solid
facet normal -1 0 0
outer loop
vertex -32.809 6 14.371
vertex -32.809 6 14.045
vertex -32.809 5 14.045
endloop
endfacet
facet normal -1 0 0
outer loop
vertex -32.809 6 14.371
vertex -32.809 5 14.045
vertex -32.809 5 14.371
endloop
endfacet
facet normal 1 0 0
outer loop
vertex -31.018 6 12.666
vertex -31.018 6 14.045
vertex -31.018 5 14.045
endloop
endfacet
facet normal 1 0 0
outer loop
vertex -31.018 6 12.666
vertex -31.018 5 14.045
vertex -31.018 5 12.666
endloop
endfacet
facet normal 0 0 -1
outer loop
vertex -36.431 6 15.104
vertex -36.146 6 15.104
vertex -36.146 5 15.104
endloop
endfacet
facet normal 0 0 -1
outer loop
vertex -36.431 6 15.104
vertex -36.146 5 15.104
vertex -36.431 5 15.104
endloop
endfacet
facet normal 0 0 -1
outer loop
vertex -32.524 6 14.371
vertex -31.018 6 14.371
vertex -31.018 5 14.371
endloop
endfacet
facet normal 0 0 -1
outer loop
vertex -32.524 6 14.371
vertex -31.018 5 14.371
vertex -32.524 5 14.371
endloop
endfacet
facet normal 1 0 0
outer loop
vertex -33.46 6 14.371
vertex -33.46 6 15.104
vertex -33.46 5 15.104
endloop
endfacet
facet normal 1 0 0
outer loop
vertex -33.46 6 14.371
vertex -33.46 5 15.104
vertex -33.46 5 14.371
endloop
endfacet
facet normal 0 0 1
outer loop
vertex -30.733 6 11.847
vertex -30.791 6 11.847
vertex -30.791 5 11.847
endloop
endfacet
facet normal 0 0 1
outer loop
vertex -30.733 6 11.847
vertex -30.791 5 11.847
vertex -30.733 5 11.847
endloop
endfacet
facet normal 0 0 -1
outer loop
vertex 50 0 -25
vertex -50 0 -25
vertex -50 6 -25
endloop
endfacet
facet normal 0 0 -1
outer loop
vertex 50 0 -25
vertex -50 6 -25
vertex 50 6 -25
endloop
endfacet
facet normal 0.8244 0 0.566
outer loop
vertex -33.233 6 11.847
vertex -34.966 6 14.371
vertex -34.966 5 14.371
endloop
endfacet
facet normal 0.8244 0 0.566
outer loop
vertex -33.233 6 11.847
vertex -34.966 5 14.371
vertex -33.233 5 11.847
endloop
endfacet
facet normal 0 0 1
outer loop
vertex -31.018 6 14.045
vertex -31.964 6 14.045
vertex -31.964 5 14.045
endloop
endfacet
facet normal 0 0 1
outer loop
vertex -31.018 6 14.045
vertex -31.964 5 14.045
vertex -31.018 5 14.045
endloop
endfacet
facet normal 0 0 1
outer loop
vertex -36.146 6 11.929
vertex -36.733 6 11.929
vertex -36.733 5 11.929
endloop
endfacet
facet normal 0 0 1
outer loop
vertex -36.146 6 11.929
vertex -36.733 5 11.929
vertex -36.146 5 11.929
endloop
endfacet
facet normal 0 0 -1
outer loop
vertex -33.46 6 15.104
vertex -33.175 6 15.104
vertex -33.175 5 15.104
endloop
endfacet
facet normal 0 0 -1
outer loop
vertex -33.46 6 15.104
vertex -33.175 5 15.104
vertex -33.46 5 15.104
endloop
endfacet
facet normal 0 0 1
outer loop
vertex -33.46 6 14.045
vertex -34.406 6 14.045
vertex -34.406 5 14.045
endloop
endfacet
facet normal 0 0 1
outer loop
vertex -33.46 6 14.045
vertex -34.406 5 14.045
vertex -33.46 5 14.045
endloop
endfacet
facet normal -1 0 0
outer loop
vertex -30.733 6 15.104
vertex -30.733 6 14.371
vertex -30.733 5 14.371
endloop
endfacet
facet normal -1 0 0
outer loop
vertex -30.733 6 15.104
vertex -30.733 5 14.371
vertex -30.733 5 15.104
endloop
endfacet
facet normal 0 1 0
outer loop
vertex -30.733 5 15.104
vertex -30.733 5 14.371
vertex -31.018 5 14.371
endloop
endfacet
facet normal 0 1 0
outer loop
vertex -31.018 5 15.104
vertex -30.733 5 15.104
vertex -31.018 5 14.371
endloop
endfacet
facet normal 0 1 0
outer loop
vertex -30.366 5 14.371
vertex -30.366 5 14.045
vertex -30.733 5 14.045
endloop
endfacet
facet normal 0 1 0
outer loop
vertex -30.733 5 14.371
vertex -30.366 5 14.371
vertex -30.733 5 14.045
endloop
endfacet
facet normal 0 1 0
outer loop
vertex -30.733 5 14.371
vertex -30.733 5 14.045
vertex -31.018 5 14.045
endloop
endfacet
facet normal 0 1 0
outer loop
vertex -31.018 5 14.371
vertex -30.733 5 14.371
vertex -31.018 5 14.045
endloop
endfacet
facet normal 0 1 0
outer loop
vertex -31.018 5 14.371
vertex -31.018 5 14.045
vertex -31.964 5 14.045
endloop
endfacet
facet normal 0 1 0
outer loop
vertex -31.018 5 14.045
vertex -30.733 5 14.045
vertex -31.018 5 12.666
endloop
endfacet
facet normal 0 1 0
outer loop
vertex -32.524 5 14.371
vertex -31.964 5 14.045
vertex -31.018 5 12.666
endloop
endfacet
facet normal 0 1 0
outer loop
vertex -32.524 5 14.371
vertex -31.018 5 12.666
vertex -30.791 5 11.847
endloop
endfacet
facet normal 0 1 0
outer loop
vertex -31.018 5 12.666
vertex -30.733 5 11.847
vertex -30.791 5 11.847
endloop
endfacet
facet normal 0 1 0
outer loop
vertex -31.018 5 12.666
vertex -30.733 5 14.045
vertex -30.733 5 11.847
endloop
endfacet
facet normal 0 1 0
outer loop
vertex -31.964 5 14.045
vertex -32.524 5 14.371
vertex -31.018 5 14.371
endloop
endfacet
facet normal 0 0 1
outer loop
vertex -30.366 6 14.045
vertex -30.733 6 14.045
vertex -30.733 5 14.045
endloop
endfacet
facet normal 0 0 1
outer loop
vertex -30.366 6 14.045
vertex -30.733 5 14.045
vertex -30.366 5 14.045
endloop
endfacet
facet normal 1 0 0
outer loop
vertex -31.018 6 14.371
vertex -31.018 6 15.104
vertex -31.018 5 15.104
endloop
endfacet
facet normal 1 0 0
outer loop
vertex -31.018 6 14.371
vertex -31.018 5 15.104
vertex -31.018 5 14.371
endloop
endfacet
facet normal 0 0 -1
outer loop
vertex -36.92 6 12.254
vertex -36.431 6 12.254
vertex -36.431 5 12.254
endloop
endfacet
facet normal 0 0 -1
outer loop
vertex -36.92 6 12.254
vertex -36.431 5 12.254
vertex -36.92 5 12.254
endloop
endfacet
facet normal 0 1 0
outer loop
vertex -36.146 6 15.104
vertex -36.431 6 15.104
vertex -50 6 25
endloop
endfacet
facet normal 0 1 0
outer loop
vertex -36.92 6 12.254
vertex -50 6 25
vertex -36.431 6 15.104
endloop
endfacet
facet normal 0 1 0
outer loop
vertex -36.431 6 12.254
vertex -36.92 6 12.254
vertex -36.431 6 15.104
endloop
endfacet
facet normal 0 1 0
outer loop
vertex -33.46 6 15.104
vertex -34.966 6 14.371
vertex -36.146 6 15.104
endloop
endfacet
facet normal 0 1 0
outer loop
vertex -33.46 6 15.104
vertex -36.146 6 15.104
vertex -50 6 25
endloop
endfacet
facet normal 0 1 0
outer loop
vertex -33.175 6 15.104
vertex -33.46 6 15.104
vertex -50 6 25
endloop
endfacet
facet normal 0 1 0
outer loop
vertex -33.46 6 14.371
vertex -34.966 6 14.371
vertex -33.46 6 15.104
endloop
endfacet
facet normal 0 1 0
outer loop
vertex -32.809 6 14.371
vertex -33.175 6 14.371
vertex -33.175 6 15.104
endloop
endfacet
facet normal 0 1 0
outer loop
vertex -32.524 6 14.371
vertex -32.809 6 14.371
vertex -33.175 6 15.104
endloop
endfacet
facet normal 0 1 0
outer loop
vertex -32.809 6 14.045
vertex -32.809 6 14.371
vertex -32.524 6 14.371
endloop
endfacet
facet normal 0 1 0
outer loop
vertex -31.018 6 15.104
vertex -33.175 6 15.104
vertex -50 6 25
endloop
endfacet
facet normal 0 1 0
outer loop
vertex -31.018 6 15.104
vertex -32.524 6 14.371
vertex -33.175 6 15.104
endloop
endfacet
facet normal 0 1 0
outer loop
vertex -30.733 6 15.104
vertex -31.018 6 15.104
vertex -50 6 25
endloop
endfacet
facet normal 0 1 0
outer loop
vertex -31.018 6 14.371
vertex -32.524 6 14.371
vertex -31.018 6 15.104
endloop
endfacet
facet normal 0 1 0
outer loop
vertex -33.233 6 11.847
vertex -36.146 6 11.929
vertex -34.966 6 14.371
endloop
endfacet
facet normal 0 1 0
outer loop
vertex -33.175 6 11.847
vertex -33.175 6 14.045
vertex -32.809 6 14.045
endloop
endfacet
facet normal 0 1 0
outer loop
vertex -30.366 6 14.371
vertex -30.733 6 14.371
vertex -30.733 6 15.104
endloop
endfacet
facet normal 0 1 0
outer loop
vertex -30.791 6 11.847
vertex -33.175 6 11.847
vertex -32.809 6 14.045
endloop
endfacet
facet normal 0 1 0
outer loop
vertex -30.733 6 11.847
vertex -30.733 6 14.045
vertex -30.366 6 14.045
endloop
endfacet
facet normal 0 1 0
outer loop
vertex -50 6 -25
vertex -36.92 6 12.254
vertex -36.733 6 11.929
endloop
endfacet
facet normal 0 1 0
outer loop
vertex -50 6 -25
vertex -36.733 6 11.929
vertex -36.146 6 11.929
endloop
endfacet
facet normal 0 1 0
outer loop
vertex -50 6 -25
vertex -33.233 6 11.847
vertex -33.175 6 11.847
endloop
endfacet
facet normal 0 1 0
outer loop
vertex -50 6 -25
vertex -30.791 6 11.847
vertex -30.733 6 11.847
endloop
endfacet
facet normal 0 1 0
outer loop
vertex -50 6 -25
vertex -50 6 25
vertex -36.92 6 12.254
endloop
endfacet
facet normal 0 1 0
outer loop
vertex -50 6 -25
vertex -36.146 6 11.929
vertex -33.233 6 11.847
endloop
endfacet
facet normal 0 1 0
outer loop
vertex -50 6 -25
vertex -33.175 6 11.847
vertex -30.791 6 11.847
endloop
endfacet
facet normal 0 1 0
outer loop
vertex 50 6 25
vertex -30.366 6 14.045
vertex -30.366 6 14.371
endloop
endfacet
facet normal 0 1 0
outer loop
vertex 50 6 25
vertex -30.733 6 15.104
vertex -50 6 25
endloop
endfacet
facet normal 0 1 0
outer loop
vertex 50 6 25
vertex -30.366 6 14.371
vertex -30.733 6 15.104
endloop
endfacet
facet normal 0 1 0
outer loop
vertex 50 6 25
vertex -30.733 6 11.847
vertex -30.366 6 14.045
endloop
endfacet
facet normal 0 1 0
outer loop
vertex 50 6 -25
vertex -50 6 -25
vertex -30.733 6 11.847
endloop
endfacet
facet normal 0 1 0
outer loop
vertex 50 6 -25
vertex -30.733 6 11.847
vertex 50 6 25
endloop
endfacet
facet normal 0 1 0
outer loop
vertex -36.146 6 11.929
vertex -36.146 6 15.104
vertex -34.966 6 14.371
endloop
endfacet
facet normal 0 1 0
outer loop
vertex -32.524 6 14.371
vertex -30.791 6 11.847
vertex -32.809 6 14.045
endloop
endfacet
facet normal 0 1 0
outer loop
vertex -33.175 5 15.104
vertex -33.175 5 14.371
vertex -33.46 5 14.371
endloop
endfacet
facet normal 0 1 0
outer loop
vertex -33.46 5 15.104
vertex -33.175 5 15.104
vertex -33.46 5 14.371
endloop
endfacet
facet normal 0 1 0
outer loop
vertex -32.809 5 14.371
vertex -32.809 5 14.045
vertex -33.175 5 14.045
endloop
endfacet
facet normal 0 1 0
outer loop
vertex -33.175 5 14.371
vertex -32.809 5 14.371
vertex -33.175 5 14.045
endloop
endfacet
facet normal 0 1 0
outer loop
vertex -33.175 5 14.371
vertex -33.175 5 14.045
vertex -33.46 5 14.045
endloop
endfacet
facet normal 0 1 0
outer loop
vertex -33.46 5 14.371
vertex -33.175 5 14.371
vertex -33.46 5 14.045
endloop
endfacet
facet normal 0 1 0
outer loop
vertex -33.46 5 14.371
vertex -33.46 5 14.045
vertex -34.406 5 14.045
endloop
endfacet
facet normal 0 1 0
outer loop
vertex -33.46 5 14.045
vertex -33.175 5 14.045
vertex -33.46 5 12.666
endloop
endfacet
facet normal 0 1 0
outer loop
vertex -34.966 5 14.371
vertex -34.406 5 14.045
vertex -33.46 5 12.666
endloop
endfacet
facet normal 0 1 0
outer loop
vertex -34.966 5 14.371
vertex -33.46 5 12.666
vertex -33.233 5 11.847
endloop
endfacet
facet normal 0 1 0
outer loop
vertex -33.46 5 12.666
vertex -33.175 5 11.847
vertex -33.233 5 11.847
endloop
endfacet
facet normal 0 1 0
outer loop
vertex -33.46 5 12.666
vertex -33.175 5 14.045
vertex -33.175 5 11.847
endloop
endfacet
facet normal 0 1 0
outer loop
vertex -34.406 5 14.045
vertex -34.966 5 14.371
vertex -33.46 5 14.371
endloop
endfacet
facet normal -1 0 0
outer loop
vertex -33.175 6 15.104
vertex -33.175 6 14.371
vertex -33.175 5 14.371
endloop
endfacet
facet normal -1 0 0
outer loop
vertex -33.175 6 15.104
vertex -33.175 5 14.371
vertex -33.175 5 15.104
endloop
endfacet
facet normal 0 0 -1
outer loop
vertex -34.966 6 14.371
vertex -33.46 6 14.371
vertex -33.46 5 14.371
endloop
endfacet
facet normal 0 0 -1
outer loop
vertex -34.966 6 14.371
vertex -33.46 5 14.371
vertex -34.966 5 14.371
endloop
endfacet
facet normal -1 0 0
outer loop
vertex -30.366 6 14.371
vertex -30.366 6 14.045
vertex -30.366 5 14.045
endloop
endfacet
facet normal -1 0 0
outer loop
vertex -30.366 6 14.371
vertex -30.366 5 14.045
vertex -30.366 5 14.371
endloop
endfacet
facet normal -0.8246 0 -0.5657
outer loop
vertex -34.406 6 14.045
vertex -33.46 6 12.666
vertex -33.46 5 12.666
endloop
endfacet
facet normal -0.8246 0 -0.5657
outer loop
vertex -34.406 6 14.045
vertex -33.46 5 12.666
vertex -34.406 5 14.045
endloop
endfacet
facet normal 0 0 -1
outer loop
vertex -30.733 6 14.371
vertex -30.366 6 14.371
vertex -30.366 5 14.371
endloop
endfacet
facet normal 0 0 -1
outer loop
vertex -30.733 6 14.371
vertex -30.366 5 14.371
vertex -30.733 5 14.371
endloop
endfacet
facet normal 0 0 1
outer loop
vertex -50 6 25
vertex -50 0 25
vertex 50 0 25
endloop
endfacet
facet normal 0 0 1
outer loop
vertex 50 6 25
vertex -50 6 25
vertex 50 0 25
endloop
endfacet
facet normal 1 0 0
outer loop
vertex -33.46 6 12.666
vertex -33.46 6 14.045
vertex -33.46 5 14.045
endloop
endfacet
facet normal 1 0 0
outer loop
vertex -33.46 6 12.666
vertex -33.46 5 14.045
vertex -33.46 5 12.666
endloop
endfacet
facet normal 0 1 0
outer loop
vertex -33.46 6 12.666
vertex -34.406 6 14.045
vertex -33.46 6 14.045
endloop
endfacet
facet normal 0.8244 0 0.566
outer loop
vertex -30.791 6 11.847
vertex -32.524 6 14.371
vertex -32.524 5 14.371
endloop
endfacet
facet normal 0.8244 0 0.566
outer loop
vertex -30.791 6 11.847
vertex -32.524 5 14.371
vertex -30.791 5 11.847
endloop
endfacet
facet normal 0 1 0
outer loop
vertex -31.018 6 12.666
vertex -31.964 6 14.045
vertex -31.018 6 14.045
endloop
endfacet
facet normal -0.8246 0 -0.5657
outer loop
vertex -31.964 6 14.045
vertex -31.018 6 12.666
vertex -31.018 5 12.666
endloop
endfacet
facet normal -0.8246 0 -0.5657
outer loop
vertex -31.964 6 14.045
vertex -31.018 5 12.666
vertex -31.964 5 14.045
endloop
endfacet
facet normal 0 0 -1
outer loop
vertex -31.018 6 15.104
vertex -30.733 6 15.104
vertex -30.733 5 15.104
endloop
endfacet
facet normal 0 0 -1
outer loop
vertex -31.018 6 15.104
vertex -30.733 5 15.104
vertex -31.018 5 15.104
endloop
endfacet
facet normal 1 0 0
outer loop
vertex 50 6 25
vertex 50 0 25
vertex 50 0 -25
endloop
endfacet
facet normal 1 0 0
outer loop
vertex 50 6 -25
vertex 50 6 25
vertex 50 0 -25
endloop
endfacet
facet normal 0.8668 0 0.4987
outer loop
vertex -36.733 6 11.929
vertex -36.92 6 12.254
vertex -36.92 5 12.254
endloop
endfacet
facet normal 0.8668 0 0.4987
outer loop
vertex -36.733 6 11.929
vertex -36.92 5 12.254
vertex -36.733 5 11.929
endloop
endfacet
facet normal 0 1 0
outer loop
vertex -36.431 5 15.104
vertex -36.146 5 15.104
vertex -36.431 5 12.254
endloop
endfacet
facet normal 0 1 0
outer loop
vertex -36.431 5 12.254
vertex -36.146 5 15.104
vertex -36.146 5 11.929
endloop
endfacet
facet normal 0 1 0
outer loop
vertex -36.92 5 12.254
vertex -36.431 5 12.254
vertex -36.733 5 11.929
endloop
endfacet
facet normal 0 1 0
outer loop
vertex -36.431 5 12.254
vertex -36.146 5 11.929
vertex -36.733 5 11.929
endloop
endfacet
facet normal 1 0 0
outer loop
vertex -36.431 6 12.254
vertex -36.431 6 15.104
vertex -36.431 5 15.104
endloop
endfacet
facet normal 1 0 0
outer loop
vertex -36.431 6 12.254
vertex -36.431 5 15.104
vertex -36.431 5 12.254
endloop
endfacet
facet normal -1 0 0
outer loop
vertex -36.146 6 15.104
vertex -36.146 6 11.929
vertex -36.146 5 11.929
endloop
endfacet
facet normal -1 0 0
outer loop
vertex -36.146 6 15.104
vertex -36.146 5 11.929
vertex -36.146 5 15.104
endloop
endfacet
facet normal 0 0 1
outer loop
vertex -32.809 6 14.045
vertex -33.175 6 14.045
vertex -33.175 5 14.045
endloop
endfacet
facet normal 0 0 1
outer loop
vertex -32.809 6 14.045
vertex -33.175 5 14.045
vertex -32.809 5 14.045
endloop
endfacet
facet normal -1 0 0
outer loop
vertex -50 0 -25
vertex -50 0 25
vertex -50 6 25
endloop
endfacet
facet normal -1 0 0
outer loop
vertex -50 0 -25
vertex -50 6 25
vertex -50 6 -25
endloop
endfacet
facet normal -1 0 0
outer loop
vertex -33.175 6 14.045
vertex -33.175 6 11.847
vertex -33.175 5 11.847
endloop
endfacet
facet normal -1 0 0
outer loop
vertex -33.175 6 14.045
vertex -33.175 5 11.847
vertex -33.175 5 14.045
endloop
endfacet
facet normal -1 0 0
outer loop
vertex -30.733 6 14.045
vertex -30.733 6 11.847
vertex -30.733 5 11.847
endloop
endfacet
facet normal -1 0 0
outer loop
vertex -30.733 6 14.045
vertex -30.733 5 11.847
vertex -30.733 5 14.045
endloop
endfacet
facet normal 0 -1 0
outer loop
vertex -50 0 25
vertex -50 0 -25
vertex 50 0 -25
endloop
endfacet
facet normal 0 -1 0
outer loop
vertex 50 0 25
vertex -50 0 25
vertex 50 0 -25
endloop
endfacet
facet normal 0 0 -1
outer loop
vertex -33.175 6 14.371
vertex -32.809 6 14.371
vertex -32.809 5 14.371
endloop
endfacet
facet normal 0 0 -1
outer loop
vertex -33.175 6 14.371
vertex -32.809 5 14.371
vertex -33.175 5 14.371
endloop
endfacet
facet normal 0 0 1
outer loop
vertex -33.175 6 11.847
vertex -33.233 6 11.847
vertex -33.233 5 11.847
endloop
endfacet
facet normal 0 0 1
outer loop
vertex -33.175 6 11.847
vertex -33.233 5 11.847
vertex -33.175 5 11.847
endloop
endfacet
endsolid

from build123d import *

# Parameters (mm, degrees)
SKETCH1_W           = 100
SKETCH1_H           = 50
BOSS_EXTRUDE1_DEPTH = 6
CUT_EXTRUDE1_DEPTH  = 1


with BuildPart() as part:
    # Sketch1 → Boss-Extrude1 (new body)
    with BuildSketch(Plane(origin=(0, 0, 0), x_dir=(1, 0, 0), z_dir=(0, 1, 0))):
        Rectangle(SKETCH1_W, SKETCH1_H)
    extrude(amount=BOSS_EXTRUDE1_DEPTH)

    # Sketch2 → Cut-Extrude1 (cut)
    # profile 1 of 3: a face of its own
    with BuildSketch(Plane(origin=(0, 6, 0), x_dir=(1, 0, 0), z_dir=(0, 1, 0))):
        Polygon((-36.733473762, -11.928699111), (-36.146429492, -11.928699111), (-36.146429492, -15.103699111), (-36.431365389, -15.103699111), (-36.431365389, -12.254340136), (-36.919826928, -12.254340136), align=None)
    # profile 2 of 3: a face of its own
    with BuildSketch(Plane(origin=(0, 6, 0), x_dir=(1, 0, 0), z_dir=(0, 1, 0))):
        Polygon((-33.232832737, -11.847288854), (-33.174955133, -11.847288854), (-33.174955133, -14.045365777), (-32.808608979, -14.045365777), (-32.808608979, -14.371006803), (-33.174955133, -14.371006803), (-33.174955133, -15.103699111), (-33.45989103, -15.103699111), (-33.45989103, -14.371006803), (-34.965980774, -14.371006803), align=None)
        Polygon((-33.45989103, -14.045365777), (-33.45989103, -12.666479559), (-34.406285261, -14.045365777), align=None, mode=Mode.SUBTRACT)
    # profile 3 of 3: a face of its own
    with BuildSketch(Plane(origin=(0, 6, 0), x_dir=(1, 0, 0), z_dir=(0, 1, 0))):
        Polygon((-30.790525045, -11.847288854), (-30.73264744, -11.847288854), (-30.73264744, -14.045365777), (-30.366301287, -14.045365777), (-30.366301287, -14.371006803), (-30.73264744, -14.371006803), (-30.73264744, -15.103699111), (-31.017583338, -15.103699111), (-31.017583338, -14.371006803), (-32.523673081, -14.371006803), align=None)
        Polygon((-31.017583338, -14.045365777), (-31.017583338, -12.666479559), (-31.963977569, -14.045365777), align=None, mode=Mode.SUBTRACT)
    extrude(amount=-CUT_EXTRUDE1_DEPTH, mode=Mode.SUBTRACT)


solid = part.part
